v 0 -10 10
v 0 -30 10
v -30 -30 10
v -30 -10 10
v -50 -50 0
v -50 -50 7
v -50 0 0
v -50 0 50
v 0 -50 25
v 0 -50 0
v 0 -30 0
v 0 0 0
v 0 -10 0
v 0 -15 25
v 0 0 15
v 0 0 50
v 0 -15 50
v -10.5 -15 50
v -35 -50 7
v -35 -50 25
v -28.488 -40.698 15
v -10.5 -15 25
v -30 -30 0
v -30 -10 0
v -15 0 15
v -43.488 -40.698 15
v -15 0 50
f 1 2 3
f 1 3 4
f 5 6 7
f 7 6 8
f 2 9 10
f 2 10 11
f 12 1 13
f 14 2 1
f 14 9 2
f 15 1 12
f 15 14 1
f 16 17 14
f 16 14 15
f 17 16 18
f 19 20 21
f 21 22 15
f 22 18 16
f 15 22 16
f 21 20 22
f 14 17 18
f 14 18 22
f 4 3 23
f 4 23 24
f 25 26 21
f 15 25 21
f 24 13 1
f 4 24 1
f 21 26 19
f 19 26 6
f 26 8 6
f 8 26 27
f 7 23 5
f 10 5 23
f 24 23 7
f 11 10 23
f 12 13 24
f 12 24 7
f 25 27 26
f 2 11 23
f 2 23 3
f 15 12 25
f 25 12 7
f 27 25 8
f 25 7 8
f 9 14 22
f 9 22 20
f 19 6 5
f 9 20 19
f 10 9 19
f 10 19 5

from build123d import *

# Parameters (mm, degrees)
F1_DEPTH  = 50
F4_DEPTH  = 43
F7_REACH  = 115.9479483752
F11_DEPTH = 35
F12_W     = 20
F12_H     = 10
F14_DEPTH = 30


with BuildPart() as f1:
    # F0 (on Right) → F1 (new body)
    with BuildSketch(Plane.YZ):
        Polygon((-50, 0), (0, 0), (0, 50), (-15, 50), (-15, 25), (-50, 25), align=None)
    extrude(amount=-F1_DEPTH)

    # F2 (on face) → F4 (cut, through all)
    with BuildSketch(Plane.XY.offset(50)):
        Polygon((0, 0), (-50, 0), (-50, -50), (-35, -50), align=None)
    extrude(amount=-F4_DEPTH, mode=Mode.SUBTRACT)

    f7_end = Plane(origin=(-13.8970588235, -19.8529411765, 22.3235294118), x_dir=(-0.5734623444, -0.8192319205, 0), z_dir=(-0.8192319205, 0.5734623444, 0))
    # F6 (on plane+point) → F7 (join, up to a plane its end follows)
    with BuildSketch(Plane.YZ.offset(-50)):
        Polygon((-50, 7), (0, 7), (0, 50), align=None)
    f7_long = extrude(amount=F7_REACH, mode=Mode.PRIVATE)
    add(split(f7_long, bisect_by=f7_end, keep=Keep.TOP, mode=Mode.PRIVATE))

    # F9 (on plane+point) → F11 (cut, through all)
    with BuildSketch(Plane.XY.offset(50)):
        Polygon((0, 0), (-15, 0), (-50, -50), (-35, -50), align=None)
    extrude(amount=-F11_DEPTH, mode=Mode.SUBTRACT)

    # F12 (on face) → F14 (cut, through all)
    with BuildSketch(Plane.YZ):
        with Locations((-20, 5)):
            Rectangle(F12_W, F12_H)
    extrude(amount=-F14_DEPTH, mode=Mode.SUBTRACT)


solid = f1.part
